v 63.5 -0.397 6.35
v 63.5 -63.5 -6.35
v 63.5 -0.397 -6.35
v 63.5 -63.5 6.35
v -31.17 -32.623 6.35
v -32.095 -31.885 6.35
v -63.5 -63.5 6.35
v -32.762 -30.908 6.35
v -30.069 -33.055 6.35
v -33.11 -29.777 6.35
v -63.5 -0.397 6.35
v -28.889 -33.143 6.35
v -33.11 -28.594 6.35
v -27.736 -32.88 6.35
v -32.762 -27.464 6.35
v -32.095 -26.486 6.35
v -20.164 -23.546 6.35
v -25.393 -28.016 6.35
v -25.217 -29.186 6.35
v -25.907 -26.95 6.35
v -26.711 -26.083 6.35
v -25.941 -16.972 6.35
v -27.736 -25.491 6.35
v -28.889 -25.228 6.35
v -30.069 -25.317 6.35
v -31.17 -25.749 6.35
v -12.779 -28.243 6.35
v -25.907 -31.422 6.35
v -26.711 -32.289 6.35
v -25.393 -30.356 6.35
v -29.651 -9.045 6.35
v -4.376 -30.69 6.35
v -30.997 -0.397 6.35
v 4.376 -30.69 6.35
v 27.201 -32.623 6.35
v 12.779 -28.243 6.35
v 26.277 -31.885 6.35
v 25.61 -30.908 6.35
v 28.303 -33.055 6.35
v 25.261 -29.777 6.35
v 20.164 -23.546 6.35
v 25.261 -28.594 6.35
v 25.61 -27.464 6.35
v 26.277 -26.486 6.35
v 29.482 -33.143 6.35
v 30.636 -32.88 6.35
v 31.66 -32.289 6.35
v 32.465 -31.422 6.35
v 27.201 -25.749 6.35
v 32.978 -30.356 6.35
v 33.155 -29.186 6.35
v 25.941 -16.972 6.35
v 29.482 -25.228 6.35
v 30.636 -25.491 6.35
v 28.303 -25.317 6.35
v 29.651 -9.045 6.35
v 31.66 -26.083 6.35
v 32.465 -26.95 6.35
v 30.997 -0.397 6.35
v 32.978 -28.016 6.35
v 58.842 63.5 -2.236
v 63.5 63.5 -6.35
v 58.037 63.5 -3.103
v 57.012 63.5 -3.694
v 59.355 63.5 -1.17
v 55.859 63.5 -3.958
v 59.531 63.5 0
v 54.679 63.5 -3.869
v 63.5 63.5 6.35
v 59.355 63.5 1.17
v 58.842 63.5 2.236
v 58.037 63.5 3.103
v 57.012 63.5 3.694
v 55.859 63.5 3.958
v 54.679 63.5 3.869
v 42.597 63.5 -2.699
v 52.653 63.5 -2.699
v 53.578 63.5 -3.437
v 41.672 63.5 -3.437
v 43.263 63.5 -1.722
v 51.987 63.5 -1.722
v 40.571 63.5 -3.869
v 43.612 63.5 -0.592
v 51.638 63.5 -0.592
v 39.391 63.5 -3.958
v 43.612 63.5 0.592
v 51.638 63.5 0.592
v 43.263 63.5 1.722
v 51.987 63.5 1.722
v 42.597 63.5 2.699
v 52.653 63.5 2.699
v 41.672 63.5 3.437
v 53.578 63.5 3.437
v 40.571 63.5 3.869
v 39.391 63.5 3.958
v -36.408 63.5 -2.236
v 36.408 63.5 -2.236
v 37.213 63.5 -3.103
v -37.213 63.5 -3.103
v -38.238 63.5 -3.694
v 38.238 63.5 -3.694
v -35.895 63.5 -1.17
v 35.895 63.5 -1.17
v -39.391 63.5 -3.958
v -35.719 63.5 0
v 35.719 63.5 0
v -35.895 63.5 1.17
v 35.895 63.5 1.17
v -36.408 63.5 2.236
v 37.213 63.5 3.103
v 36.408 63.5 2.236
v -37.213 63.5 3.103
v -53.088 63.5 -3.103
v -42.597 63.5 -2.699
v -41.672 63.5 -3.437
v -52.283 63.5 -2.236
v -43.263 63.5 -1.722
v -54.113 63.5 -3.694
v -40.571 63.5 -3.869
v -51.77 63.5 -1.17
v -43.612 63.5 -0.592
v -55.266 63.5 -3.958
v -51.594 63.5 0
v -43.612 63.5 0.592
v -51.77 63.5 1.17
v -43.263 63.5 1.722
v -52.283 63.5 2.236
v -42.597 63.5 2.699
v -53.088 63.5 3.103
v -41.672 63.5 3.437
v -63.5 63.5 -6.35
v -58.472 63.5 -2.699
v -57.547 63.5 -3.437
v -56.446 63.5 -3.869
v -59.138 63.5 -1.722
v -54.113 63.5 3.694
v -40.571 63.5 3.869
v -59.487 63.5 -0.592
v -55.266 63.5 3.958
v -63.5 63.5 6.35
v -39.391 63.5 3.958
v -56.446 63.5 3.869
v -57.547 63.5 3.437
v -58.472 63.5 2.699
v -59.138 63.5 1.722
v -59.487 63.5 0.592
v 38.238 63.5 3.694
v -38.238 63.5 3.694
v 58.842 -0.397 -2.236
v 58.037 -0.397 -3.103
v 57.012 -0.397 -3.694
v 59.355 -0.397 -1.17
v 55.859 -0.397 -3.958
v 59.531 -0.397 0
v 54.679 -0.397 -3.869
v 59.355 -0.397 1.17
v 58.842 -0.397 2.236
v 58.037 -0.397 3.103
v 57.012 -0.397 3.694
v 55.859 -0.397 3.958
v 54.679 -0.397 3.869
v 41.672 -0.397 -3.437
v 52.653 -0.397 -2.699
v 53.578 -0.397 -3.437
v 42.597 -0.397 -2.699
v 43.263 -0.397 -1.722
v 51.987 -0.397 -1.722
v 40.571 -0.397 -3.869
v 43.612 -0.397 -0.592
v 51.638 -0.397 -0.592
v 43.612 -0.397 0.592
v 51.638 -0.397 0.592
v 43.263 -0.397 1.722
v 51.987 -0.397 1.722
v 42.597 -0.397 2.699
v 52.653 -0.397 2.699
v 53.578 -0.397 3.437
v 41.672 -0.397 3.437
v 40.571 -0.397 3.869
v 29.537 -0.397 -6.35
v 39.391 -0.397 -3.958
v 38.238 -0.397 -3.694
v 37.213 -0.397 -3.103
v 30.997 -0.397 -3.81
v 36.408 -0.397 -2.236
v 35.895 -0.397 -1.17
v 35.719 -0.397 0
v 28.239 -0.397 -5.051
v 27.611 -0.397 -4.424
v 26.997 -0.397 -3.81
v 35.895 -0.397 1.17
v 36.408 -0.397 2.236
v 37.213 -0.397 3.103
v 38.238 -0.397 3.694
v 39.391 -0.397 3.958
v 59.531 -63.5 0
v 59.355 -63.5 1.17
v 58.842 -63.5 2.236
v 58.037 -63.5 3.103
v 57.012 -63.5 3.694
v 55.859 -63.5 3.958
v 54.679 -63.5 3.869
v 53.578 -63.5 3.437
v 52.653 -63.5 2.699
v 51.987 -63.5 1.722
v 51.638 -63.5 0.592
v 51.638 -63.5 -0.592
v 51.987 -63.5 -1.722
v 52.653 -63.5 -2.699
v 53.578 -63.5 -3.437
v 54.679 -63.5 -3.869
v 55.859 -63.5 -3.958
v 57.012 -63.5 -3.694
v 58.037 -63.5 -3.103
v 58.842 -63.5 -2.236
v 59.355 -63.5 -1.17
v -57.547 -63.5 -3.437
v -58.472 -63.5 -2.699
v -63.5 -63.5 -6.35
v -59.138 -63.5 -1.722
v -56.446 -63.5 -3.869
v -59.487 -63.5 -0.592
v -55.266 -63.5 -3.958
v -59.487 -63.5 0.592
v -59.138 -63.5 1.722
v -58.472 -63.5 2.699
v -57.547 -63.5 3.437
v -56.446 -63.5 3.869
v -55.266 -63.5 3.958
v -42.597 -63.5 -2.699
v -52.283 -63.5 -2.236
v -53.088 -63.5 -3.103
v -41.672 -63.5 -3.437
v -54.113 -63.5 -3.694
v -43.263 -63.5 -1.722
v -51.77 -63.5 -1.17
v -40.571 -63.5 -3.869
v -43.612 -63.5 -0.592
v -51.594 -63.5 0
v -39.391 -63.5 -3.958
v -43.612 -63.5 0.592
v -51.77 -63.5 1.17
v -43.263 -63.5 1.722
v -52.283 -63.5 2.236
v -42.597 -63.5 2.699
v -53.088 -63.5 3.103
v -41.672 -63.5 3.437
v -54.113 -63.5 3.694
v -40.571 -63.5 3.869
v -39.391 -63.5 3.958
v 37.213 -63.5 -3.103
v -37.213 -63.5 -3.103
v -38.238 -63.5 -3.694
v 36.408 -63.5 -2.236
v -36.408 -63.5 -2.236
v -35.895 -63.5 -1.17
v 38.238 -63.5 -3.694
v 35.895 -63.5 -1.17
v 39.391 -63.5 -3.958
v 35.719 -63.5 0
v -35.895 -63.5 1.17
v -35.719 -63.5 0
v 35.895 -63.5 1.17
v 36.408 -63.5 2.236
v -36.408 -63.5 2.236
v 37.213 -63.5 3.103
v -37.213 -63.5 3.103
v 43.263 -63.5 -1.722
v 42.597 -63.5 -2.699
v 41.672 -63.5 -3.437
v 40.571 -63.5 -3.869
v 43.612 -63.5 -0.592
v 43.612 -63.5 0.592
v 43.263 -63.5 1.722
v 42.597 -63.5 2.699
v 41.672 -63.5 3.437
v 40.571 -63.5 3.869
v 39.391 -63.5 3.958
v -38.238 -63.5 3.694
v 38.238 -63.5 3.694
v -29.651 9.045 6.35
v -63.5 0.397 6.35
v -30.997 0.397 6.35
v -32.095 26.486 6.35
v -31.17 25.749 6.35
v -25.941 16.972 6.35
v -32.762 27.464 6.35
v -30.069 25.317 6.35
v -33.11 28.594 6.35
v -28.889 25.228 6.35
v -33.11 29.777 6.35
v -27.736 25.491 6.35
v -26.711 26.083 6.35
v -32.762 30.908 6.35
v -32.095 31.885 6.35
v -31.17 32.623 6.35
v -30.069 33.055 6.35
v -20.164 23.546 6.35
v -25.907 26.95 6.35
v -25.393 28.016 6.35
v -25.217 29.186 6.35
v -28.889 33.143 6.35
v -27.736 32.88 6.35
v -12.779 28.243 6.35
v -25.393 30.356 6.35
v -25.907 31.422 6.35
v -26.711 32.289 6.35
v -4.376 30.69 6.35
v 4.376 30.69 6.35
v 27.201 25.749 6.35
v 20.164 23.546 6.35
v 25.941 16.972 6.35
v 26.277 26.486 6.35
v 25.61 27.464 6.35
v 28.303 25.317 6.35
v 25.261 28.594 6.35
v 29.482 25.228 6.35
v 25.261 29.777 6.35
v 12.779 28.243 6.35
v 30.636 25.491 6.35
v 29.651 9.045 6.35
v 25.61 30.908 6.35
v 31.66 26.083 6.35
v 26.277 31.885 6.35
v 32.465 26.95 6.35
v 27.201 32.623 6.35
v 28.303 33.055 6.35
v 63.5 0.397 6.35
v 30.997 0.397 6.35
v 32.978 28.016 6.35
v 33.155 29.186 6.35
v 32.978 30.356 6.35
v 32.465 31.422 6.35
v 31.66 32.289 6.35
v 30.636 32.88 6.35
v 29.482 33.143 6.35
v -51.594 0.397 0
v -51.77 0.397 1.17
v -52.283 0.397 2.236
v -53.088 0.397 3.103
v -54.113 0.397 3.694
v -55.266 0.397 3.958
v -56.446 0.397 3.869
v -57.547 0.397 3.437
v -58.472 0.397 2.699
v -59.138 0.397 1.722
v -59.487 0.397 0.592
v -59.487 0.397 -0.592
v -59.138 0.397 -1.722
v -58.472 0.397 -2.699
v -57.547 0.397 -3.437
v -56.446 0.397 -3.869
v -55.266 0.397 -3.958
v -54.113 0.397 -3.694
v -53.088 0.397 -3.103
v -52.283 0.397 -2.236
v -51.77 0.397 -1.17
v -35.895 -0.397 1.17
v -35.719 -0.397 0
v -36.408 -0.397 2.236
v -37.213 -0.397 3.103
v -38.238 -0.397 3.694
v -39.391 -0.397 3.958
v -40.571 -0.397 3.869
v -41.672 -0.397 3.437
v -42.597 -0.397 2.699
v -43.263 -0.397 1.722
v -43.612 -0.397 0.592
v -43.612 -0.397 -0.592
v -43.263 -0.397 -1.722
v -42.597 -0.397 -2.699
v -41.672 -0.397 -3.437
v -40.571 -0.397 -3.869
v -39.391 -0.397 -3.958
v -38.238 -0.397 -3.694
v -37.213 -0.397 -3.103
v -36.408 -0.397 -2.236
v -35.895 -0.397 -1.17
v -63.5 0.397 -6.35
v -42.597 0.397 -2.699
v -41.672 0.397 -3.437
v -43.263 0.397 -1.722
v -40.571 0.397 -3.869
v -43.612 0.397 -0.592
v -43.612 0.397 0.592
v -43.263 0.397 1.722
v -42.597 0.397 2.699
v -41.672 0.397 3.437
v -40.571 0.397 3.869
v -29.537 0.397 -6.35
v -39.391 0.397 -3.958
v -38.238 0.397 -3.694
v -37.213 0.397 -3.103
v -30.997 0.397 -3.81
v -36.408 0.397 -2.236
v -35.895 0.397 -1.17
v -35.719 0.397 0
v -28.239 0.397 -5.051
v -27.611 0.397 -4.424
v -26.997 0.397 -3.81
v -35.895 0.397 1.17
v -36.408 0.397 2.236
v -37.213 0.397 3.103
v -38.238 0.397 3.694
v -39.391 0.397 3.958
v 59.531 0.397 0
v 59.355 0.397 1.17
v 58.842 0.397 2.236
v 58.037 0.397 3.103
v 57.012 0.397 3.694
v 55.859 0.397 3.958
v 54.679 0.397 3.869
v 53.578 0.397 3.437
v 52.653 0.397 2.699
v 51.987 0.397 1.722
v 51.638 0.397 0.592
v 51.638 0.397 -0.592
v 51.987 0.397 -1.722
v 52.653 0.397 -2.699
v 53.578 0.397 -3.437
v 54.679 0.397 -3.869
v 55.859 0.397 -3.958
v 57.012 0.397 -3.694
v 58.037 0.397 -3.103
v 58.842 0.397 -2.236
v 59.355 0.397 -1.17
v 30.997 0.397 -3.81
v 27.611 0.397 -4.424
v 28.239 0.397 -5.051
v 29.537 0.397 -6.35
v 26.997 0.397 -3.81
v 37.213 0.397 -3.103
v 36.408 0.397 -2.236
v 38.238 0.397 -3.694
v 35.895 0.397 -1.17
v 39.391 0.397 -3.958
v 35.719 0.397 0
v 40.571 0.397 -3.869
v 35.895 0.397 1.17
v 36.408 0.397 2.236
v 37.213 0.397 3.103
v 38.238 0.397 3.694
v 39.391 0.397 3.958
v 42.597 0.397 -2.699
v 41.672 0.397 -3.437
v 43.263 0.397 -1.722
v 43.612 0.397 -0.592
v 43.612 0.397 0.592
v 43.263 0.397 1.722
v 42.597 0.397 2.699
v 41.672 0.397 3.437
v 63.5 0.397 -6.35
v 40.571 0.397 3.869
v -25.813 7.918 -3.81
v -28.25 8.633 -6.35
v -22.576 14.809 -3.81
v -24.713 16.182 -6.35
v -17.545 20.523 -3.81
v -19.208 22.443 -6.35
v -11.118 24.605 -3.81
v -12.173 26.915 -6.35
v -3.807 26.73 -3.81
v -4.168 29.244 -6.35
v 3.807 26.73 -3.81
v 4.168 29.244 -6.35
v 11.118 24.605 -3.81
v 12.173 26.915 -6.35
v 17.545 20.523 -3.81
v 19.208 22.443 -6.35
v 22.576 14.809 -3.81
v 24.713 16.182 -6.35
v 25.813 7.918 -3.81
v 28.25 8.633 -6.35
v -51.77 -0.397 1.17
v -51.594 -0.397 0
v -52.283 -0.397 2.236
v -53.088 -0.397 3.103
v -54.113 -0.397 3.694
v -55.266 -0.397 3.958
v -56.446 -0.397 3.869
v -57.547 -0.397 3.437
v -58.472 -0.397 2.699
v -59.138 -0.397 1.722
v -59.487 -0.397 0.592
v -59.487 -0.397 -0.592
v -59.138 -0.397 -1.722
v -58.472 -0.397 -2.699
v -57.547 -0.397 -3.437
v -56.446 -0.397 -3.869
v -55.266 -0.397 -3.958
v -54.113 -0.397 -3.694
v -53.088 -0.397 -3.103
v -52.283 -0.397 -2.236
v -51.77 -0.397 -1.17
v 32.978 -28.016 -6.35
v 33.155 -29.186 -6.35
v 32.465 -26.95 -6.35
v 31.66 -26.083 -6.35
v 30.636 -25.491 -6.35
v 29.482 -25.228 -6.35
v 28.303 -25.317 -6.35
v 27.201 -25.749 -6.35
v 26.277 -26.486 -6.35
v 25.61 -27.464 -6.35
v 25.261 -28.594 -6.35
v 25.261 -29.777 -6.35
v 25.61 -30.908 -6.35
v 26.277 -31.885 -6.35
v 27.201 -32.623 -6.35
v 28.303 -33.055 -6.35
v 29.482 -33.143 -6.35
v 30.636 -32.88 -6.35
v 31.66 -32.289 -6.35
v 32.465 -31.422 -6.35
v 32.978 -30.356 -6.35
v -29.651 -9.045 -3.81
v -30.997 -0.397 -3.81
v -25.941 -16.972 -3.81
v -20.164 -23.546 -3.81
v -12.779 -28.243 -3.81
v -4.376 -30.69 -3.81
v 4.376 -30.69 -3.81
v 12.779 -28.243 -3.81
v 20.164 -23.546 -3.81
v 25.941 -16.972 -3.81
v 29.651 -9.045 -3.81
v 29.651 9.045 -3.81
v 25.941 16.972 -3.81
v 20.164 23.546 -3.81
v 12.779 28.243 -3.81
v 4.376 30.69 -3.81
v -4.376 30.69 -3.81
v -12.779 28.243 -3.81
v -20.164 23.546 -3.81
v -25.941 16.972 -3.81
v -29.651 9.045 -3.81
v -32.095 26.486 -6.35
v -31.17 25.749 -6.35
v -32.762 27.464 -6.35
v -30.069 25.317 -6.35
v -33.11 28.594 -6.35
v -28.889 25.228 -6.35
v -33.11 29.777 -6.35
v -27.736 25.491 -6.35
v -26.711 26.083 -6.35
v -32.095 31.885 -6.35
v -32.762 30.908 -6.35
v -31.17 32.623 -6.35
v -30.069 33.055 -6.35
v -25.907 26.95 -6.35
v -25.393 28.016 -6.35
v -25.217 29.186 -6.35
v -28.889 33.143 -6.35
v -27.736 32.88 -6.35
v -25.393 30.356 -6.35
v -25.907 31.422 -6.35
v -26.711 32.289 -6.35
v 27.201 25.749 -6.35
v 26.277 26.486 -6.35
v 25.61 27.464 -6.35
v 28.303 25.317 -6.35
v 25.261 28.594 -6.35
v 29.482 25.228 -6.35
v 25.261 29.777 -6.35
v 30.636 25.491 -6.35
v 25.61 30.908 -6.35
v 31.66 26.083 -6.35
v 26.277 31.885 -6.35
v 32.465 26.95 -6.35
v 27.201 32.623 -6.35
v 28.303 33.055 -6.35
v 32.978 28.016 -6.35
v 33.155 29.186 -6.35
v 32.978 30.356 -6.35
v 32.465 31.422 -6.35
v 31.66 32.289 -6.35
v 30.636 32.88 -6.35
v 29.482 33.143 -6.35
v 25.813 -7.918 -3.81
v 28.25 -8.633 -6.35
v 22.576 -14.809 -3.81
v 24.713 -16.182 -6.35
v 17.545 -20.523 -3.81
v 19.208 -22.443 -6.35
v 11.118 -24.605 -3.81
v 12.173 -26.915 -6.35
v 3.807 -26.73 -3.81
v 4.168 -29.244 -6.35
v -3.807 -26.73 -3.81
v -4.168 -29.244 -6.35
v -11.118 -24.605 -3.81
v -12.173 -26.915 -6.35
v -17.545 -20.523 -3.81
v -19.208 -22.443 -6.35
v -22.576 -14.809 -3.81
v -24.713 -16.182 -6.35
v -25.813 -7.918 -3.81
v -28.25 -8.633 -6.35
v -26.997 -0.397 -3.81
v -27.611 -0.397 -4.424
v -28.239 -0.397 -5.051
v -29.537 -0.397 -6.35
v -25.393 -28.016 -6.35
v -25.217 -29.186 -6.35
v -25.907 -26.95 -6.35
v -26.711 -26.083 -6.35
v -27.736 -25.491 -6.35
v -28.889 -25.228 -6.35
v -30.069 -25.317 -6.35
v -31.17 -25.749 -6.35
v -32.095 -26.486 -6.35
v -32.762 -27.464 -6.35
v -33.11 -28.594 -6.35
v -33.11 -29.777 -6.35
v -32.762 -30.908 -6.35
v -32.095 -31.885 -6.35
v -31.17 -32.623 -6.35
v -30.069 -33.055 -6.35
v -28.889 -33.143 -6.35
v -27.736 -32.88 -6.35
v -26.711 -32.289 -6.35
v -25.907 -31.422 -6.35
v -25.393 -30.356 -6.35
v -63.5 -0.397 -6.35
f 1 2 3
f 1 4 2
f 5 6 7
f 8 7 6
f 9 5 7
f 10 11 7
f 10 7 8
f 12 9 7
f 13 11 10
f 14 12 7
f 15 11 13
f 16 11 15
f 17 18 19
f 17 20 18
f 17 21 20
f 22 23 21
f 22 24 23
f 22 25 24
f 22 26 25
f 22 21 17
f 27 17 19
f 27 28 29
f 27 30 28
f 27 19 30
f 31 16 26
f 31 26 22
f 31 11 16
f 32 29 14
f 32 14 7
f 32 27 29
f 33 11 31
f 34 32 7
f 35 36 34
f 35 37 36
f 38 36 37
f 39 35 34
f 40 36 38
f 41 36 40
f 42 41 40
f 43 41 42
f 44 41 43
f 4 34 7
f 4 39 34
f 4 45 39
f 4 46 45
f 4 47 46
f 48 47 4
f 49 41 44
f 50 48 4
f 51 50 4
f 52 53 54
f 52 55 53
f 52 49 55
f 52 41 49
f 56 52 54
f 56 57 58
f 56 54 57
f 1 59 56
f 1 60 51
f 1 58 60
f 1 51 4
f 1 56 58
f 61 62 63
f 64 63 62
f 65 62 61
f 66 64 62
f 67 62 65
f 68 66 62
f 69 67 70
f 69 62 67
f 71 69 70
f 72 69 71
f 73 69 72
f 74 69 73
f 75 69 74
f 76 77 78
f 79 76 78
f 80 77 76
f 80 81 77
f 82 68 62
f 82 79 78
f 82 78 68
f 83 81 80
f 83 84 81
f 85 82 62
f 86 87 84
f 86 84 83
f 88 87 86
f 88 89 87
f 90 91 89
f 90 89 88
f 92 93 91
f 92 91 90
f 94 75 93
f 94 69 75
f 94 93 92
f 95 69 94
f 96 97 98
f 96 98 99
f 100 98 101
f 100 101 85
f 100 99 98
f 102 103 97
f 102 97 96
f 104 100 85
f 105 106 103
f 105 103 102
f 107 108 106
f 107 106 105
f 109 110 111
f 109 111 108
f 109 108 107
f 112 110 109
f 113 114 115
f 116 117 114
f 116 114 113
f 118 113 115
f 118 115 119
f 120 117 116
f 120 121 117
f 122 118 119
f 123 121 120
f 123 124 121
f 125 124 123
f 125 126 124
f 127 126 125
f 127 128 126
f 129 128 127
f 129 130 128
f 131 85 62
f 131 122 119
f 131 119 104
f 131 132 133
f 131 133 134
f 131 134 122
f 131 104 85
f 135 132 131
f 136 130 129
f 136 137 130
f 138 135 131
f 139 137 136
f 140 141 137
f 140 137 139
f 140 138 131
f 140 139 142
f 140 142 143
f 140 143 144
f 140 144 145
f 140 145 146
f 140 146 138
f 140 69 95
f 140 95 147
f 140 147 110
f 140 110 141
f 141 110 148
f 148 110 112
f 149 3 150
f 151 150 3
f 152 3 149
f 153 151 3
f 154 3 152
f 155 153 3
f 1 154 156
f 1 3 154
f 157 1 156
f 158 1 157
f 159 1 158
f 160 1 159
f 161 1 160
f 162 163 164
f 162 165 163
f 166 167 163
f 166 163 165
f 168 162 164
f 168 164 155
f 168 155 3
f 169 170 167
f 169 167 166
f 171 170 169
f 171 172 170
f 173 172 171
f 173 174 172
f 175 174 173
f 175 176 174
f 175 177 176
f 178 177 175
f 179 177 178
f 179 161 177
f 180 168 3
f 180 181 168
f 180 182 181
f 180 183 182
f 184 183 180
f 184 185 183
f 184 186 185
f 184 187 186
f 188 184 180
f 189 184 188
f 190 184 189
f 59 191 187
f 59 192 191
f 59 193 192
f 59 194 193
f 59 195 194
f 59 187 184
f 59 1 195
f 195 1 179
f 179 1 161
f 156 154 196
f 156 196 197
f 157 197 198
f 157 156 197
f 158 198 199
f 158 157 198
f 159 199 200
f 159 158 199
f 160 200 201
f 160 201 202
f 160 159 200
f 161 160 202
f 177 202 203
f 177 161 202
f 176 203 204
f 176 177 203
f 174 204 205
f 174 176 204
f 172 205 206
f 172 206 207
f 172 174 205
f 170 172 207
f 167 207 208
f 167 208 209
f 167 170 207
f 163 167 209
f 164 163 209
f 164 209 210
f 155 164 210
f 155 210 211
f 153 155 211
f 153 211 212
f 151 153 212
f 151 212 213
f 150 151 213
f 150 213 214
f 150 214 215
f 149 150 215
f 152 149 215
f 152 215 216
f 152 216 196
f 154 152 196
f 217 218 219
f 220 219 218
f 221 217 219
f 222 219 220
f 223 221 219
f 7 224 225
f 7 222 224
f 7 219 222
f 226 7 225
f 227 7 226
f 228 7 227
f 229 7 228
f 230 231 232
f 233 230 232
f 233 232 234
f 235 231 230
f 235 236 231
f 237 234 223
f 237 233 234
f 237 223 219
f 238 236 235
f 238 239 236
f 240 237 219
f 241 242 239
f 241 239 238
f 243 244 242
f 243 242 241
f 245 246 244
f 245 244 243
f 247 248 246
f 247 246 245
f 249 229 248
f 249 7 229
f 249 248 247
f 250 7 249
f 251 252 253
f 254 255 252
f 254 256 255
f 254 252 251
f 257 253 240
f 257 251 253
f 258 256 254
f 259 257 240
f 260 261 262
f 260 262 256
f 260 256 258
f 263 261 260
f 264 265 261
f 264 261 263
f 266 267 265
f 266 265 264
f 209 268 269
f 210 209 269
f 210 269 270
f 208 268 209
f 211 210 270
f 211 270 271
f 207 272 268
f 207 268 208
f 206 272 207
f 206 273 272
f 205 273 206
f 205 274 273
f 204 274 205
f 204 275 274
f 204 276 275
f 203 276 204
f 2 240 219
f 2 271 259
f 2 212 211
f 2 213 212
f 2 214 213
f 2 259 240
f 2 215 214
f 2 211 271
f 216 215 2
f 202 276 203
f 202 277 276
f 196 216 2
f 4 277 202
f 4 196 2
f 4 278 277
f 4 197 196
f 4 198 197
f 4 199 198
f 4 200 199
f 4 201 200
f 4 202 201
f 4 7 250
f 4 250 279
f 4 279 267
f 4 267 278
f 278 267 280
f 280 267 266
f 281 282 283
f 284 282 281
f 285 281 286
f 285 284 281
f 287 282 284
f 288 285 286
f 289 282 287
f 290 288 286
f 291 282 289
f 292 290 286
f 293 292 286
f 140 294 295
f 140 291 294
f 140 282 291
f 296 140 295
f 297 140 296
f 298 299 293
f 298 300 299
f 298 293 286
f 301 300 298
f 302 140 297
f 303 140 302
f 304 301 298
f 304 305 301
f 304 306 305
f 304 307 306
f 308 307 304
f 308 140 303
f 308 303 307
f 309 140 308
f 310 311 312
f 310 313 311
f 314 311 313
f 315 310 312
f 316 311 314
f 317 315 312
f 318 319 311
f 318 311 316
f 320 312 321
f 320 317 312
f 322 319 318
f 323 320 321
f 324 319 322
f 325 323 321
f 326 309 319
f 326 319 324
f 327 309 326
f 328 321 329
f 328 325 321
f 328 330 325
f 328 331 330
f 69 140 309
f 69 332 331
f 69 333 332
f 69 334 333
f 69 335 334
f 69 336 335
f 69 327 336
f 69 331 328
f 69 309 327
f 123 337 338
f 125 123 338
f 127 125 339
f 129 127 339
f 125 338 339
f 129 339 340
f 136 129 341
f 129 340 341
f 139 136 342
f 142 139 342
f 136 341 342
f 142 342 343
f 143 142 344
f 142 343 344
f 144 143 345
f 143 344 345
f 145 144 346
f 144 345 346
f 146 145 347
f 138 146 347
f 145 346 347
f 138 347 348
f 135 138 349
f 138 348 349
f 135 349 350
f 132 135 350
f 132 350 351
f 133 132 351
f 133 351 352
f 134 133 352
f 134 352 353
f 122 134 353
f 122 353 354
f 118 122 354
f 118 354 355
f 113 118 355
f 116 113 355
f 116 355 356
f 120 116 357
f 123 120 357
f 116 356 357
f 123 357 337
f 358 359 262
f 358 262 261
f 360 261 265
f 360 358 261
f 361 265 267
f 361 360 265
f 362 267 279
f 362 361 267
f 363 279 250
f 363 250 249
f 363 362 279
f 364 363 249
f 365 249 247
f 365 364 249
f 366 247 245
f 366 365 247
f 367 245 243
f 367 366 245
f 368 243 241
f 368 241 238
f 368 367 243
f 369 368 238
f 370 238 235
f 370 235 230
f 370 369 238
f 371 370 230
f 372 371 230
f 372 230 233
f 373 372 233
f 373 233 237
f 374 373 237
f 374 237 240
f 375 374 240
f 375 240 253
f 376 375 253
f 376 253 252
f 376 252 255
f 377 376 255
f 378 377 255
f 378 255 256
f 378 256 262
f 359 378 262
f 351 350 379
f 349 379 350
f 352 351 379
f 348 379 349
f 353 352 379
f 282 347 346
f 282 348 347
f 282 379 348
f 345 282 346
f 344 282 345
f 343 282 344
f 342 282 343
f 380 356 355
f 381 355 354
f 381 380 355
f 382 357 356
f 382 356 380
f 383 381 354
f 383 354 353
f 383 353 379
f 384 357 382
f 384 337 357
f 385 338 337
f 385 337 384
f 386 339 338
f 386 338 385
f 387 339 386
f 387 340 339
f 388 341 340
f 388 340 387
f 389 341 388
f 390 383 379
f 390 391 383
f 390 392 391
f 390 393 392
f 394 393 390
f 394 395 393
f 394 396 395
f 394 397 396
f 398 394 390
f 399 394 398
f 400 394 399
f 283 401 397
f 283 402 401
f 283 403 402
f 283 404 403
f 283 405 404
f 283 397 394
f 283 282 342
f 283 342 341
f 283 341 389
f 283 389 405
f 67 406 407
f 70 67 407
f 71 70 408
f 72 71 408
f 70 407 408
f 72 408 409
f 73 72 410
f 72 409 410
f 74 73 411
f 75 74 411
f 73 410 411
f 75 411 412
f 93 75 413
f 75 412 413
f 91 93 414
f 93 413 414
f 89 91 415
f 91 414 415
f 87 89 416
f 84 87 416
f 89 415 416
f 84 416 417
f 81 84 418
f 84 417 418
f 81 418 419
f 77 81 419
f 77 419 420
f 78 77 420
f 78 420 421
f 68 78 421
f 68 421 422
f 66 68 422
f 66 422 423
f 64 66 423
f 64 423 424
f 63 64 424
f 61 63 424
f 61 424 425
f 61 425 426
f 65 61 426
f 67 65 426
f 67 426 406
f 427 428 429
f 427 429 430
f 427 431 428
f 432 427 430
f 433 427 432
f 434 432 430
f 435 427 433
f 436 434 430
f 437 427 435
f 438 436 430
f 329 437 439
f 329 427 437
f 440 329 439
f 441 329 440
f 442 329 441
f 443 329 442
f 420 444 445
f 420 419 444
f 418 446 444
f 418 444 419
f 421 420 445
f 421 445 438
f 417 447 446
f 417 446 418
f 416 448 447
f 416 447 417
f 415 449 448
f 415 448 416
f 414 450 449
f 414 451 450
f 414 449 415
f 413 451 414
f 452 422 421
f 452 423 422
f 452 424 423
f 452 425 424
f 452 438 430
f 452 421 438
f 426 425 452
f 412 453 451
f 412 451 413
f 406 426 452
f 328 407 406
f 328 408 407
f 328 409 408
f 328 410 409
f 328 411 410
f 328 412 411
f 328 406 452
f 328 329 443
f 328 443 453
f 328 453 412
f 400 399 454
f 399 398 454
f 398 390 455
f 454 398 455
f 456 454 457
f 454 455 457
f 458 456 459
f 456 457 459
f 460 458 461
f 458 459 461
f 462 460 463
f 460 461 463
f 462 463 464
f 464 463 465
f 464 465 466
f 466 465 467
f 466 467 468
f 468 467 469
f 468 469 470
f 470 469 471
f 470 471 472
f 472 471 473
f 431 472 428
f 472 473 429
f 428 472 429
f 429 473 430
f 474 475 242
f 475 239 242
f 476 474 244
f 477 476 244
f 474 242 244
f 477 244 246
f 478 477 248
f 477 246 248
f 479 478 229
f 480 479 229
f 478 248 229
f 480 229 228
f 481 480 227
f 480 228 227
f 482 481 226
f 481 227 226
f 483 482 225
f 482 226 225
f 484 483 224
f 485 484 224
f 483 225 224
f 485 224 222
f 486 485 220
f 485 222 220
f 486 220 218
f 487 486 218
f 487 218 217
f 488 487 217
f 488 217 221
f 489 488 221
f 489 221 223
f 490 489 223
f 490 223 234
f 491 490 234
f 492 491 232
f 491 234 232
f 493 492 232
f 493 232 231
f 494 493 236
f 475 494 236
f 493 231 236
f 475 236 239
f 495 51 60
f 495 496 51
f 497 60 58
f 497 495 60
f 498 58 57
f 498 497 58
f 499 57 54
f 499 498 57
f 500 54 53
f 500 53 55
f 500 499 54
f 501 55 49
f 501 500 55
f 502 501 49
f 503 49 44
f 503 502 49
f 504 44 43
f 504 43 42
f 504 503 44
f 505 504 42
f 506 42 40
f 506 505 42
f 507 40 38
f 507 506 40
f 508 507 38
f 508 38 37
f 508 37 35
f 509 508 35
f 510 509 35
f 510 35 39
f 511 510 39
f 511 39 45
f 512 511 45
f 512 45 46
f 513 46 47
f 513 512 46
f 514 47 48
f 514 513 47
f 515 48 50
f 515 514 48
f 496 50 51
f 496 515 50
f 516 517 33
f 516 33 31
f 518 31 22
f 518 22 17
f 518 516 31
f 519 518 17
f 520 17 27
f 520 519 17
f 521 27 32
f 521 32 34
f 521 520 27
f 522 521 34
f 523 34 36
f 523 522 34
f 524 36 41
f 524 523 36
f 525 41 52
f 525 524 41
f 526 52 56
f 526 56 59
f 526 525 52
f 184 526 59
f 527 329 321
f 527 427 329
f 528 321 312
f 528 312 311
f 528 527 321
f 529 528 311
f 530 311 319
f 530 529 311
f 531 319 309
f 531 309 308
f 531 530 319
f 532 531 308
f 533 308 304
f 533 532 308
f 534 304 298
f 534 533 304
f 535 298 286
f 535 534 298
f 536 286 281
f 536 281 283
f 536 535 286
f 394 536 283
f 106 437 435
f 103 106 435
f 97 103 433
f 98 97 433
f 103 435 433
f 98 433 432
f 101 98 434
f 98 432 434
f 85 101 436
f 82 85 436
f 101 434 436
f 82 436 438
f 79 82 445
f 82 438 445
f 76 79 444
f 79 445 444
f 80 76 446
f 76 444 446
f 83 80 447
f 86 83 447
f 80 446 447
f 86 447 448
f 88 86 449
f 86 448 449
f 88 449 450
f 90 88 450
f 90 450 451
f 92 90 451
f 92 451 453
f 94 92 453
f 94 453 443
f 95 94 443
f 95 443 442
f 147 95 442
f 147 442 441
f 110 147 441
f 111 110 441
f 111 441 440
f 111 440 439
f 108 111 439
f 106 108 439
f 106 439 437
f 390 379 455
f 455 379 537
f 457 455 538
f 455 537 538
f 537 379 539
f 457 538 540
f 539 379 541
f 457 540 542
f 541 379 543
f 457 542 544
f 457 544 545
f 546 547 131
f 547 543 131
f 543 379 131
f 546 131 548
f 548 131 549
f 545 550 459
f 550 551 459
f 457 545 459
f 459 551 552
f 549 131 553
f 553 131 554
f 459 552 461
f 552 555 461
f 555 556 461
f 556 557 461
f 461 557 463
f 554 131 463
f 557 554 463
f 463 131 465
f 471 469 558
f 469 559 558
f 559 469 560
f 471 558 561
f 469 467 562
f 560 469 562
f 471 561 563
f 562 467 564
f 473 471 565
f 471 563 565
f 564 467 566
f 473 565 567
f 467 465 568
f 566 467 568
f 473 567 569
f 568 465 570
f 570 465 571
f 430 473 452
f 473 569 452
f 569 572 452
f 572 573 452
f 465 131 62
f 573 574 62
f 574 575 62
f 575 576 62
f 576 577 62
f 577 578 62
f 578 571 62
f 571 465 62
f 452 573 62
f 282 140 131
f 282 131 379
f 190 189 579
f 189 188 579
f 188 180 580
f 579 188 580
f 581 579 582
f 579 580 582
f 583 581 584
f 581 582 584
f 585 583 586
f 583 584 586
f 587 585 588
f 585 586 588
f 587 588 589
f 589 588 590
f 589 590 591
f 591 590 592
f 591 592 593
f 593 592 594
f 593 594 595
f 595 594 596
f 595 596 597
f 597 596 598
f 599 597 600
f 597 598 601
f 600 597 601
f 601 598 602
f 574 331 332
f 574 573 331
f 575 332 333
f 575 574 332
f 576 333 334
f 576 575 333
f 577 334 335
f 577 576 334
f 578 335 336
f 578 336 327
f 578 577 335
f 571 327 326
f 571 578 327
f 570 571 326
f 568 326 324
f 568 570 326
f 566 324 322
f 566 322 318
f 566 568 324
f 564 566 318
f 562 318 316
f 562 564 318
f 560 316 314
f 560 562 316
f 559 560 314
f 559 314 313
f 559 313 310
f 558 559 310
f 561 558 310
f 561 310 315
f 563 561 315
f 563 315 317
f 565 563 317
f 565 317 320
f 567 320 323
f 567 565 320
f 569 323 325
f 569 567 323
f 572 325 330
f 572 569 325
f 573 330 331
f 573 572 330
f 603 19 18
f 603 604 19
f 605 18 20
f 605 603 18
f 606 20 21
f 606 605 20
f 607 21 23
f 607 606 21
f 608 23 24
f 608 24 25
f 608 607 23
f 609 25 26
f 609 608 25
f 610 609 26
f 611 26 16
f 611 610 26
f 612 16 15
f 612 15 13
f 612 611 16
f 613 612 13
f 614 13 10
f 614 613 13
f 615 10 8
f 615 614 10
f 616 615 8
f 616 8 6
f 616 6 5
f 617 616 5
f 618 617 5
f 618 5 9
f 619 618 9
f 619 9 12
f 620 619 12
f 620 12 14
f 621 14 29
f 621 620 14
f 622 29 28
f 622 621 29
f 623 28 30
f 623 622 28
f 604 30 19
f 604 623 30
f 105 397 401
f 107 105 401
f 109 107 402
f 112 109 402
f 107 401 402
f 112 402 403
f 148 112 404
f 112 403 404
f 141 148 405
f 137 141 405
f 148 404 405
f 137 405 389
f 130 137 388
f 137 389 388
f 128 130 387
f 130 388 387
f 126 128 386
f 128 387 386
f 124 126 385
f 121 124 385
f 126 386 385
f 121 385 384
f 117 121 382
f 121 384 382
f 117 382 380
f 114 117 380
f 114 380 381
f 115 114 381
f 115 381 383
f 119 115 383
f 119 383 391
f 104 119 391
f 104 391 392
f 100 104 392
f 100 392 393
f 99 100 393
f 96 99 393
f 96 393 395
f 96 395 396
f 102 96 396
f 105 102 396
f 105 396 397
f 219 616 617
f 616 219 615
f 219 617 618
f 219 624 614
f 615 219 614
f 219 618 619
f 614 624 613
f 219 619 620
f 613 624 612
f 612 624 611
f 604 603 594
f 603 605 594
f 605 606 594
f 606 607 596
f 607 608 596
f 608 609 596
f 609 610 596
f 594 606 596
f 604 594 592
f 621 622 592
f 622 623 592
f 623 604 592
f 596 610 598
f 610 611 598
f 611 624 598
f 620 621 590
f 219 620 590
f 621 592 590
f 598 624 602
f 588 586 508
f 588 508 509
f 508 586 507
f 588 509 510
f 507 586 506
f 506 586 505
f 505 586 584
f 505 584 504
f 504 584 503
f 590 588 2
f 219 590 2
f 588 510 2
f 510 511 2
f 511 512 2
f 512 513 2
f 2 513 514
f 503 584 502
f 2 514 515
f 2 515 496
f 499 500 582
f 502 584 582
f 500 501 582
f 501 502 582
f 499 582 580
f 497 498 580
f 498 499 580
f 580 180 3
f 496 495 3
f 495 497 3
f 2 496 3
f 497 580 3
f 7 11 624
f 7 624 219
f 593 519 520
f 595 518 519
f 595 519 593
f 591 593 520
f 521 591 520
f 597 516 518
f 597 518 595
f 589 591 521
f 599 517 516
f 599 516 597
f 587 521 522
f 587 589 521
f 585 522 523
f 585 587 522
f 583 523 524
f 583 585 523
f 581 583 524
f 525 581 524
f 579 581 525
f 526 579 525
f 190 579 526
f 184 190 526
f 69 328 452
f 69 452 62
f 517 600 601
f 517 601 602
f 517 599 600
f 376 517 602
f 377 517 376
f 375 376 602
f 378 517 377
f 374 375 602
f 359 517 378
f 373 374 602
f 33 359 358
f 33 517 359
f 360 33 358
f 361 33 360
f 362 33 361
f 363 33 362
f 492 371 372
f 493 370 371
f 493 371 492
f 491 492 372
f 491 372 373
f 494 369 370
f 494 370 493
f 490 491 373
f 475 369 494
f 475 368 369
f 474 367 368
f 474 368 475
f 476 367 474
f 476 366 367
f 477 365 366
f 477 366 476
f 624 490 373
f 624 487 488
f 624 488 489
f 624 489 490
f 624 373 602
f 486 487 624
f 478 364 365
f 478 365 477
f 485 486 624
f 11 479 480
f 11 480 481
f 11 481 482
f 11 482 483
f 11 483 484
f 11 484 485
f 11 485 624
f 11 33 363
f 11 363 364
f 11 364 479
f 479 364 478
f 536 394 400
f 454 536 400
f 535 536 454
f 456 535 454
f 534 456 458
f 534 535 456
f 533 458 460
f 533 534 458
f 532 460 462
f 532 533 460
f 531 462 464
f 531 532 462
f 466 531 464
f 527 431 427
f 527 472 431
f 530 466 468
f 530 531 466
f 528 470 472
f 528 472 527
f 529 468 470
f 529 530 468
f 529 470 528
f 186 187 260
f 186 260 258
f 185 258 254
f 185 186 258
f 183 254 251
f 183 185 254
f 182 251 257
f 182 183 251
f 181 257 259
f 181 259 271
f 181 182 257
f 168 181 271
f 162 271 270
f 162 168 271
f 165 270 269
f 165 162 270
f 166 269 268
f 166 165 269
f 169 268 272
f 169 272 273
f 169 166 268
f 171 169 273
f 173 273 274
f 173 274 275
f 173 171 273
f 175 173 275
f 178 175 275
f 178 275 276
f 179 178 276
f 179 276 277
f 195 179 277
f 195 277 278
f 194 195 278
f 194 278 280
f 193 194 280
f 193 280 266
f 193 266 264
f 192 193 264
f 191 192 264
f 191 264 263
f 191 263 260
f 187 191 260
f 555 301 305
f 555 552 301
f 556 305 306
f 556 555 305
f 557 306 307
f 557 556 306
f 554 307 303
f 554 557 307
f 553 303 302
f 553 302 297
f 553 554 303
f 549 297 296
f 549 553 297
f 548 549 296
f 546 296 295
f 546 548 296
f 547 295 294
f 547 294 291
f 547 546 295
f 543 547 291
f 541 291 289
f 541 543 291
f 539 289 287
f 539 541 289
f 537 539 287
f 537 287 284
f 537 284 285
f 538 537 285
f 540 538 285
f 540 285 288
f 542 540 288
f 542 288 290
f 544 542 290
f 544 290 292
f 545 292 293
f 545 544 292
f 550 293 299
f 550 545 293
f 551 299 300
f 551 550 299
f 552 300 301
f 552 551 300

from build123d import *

# Parameters (mm, degrees)
F0_R          = 3.96875
F1_DEPTH      = 6.35
F2_DEPTH      = 3.81
F2_DEPTH_BACK = 6.35
F3_SIZE       = 2.53999
F3_2_SIZE     = 2.53999
F4_R          = 3.96875
F5_DEPTH      = 63.5


# Not quite as in the source:
# - a fillet or chamfer is up to 0.001 mm smaller than in the source, because OpenCascade refuses the exact size


with BuildPart() as f1:
    # F0 (on Top) → F1 (new body, symmetric)
    with BuildSketch(Plane.XY):
        with BuildLine():
            Line((26.9970829949, 0.396875), (30.9974594158, 0.396875))
            ThreePointArc((30.9974594158, 0.396875), (0, 31), (-30.9974594158, 0.396875))
            Line((-30.9974594158, 0.396875), (-26.9970829949, 0.396875))
            ThreePointArc((-26.9970829949, 0.396875), (0, 27), (26.9970829949, 0.396875))
        make_face()
        with BuildLine():
            ThreePointArc((-30.9974594158, 0.396875), (0, 31), (30.9974594158, 0.396875))
            Line((30.9974594158, 0.396875), (63.5, 0.396875))
            Line((63.5, 0.396875), (63.5, 63.5))
            Line((63.5, 63.5), (-63.5, 63.5))
            Line((-63.5, 63.5), (-63.5, 0.396875))
            Line((-63.5, 0.396875), (-30.9974594158, 0.396875))
        make_face()
        with Locations((-29.1858323935, 29.1858323935)):
            Circle(F0_R, mode=Mode.SUBTRACT)
        with Locations((29.1858323935, 29.1858323935)):
            Circle(F0_R, mode=Mode.SUBTRACT)
    extrude(amount=F1_DEPTH, both=True)


with BuildPart() as f1b:
    # F0 (on Top) → F1, piece 2 (new body, symmetric)
    with BuildSketch(Plane.XY):
        with BuildLine():
            Line((63.5, -0.396875), (30.9974594158, -0.396875))
            ThreePointArc((30.9974594158, -0.396875), (0, -31), (-30.9974594158, -0.396875))
            Line((-30.9974594158, -0.396875), (-63.5, -0.396875))
            Line((-63.5, -0.396875), (-63.5, -63.5))
            Line((-63.5, -63.5), (63.5, -63.5))
            Line((63.5, -63.5), (63.5, -0.396875))
        make_face()
        with Locations((-29.1858323935, -29.1858323935)):
            Circle(F0_R, mode=Mode.SUBTRACT)
        with Locations((29.1858323935, -29.1858323935)):
            Circle(F0_R, mode=Mode.SUBTRACT)
        with BuildLine():
            ThreePointArc((-30.9974594158, -0.396875), (0, -31), (30.9974594158, -0.396875))
            Line((30.9974594158, -0.396875), (26.9970829949, -0.396875))
            ThreePointArc((26.9970829949, -0.396875), (0, -27), (-26.9970829949, -0.396875))
            Line((-26.9970829949, -0.396875), (-30.9974594158, -0.396875))
        make_face()
    extrude(amount=F1_DEPTH, both=True)


with BuildPart() as f2_tool:
    # F0 (on Top) → F2 (new body, two sides)
    with BuildSketch(Plane.XY) as f2_sk:
        with BuildLine():
            ThreePointArc((-30.9974594158, -0.396875), (0, -31), (30.9974594158, -0.396875))
            Line((30.9974594158, -0.396875), (26.9970829949, -0.396875))
            ThreePointArc((26.9970829949, -0.396875), (0, -27), (-26.9970829949, -0.396875))
            Line((-26.9970829949, -0.396875), (-30.9974594158, -0.396875))
        make_face()
        with BuildLine():
            Line((26.9970829949, 0.396875), (30.9974594158, 0.396875))
            ThreePointArc((30.9974594158, 0.396875), (0, 31), (-30.9974594158, 0.396875))
            Line((-30.9974594158, 0.396875), (-26.9970829949, 0.396875))
            ThreePointArc((-26.9970829949, 0.396875), (0, 27), (26.9970829949, 0.396875))
        make_face()
    extrude(amount=-F2_DEPTH)
    extrude(f2_sk.sketch, amount=F2_DEPTH_BACK)


with BuildPart() as f1_1:
    add(f1.part)

    # F2: cut by f2_tool
    add(f2_tool.part, mode=Mode.SUBTRACT)

    # F3 (size 2.54 in the source; OpenCascade refuses exactly that, so slightly less here)
    f3_edges = [f1_1.edges().sort_by_distance(p)[0] for p in [
        (0, 27, -6.35),
    ]]
    chamfer(f3_edges, length=F3_SIZE)


with BuildPart() as f1b_1:
    add(f1b.part)

    # F2: cut by f2_tool
    add(f2_tool.part, mode=Mode.SUBTRACT)

    # F3#2 (size 2.54 in the source; OpenCascade refuses exactly that, so slightly less here)
    f3_2_edges = [f1b_1.edges().sort_by_distance(p)[0] for p in [
        (0, -27, -6.35),
    ]]
    chamfer(f3_2_edges, length=F3_2_SIZE)


with BuildPart() as f5_tool:
    # F4 (on Front) → F5 (new body, symmetric)
    with BuildSketch(Plane.XZ):
        with BuildLine():
            ThreePointArc((43.65625, 0), (39.6875, 3.96875), (35.71875, 0))
            ThreePointArc((35.71875, 0), (39.6875, -3.96875), (43.65625, 0))
        make_face()
        with Locations((55.5625, 0)):
            Circle(F4_R)
        with Locations((-39.6875, 0)):
            Circle(F4_R)
        with Locations((-55.5625, 0)):
            Circle(F4_R)
    extrude(amount=F5_DEPTH, both=True)


with BuildPart() as f1_2:
    add(f1_1.part)

    # F5: cut by f5_tool
    add(f5_tool.part, mode=Mode.SUBTRACT)


with BuildPart() as f1b_2:
    add(f1b_1.part)

    # F5: cut by f5_tool
    add(f5_tool.part, mode=Mode.SUBTRACT)


solid = Compound([f1_2.part, f1b_2.part])
